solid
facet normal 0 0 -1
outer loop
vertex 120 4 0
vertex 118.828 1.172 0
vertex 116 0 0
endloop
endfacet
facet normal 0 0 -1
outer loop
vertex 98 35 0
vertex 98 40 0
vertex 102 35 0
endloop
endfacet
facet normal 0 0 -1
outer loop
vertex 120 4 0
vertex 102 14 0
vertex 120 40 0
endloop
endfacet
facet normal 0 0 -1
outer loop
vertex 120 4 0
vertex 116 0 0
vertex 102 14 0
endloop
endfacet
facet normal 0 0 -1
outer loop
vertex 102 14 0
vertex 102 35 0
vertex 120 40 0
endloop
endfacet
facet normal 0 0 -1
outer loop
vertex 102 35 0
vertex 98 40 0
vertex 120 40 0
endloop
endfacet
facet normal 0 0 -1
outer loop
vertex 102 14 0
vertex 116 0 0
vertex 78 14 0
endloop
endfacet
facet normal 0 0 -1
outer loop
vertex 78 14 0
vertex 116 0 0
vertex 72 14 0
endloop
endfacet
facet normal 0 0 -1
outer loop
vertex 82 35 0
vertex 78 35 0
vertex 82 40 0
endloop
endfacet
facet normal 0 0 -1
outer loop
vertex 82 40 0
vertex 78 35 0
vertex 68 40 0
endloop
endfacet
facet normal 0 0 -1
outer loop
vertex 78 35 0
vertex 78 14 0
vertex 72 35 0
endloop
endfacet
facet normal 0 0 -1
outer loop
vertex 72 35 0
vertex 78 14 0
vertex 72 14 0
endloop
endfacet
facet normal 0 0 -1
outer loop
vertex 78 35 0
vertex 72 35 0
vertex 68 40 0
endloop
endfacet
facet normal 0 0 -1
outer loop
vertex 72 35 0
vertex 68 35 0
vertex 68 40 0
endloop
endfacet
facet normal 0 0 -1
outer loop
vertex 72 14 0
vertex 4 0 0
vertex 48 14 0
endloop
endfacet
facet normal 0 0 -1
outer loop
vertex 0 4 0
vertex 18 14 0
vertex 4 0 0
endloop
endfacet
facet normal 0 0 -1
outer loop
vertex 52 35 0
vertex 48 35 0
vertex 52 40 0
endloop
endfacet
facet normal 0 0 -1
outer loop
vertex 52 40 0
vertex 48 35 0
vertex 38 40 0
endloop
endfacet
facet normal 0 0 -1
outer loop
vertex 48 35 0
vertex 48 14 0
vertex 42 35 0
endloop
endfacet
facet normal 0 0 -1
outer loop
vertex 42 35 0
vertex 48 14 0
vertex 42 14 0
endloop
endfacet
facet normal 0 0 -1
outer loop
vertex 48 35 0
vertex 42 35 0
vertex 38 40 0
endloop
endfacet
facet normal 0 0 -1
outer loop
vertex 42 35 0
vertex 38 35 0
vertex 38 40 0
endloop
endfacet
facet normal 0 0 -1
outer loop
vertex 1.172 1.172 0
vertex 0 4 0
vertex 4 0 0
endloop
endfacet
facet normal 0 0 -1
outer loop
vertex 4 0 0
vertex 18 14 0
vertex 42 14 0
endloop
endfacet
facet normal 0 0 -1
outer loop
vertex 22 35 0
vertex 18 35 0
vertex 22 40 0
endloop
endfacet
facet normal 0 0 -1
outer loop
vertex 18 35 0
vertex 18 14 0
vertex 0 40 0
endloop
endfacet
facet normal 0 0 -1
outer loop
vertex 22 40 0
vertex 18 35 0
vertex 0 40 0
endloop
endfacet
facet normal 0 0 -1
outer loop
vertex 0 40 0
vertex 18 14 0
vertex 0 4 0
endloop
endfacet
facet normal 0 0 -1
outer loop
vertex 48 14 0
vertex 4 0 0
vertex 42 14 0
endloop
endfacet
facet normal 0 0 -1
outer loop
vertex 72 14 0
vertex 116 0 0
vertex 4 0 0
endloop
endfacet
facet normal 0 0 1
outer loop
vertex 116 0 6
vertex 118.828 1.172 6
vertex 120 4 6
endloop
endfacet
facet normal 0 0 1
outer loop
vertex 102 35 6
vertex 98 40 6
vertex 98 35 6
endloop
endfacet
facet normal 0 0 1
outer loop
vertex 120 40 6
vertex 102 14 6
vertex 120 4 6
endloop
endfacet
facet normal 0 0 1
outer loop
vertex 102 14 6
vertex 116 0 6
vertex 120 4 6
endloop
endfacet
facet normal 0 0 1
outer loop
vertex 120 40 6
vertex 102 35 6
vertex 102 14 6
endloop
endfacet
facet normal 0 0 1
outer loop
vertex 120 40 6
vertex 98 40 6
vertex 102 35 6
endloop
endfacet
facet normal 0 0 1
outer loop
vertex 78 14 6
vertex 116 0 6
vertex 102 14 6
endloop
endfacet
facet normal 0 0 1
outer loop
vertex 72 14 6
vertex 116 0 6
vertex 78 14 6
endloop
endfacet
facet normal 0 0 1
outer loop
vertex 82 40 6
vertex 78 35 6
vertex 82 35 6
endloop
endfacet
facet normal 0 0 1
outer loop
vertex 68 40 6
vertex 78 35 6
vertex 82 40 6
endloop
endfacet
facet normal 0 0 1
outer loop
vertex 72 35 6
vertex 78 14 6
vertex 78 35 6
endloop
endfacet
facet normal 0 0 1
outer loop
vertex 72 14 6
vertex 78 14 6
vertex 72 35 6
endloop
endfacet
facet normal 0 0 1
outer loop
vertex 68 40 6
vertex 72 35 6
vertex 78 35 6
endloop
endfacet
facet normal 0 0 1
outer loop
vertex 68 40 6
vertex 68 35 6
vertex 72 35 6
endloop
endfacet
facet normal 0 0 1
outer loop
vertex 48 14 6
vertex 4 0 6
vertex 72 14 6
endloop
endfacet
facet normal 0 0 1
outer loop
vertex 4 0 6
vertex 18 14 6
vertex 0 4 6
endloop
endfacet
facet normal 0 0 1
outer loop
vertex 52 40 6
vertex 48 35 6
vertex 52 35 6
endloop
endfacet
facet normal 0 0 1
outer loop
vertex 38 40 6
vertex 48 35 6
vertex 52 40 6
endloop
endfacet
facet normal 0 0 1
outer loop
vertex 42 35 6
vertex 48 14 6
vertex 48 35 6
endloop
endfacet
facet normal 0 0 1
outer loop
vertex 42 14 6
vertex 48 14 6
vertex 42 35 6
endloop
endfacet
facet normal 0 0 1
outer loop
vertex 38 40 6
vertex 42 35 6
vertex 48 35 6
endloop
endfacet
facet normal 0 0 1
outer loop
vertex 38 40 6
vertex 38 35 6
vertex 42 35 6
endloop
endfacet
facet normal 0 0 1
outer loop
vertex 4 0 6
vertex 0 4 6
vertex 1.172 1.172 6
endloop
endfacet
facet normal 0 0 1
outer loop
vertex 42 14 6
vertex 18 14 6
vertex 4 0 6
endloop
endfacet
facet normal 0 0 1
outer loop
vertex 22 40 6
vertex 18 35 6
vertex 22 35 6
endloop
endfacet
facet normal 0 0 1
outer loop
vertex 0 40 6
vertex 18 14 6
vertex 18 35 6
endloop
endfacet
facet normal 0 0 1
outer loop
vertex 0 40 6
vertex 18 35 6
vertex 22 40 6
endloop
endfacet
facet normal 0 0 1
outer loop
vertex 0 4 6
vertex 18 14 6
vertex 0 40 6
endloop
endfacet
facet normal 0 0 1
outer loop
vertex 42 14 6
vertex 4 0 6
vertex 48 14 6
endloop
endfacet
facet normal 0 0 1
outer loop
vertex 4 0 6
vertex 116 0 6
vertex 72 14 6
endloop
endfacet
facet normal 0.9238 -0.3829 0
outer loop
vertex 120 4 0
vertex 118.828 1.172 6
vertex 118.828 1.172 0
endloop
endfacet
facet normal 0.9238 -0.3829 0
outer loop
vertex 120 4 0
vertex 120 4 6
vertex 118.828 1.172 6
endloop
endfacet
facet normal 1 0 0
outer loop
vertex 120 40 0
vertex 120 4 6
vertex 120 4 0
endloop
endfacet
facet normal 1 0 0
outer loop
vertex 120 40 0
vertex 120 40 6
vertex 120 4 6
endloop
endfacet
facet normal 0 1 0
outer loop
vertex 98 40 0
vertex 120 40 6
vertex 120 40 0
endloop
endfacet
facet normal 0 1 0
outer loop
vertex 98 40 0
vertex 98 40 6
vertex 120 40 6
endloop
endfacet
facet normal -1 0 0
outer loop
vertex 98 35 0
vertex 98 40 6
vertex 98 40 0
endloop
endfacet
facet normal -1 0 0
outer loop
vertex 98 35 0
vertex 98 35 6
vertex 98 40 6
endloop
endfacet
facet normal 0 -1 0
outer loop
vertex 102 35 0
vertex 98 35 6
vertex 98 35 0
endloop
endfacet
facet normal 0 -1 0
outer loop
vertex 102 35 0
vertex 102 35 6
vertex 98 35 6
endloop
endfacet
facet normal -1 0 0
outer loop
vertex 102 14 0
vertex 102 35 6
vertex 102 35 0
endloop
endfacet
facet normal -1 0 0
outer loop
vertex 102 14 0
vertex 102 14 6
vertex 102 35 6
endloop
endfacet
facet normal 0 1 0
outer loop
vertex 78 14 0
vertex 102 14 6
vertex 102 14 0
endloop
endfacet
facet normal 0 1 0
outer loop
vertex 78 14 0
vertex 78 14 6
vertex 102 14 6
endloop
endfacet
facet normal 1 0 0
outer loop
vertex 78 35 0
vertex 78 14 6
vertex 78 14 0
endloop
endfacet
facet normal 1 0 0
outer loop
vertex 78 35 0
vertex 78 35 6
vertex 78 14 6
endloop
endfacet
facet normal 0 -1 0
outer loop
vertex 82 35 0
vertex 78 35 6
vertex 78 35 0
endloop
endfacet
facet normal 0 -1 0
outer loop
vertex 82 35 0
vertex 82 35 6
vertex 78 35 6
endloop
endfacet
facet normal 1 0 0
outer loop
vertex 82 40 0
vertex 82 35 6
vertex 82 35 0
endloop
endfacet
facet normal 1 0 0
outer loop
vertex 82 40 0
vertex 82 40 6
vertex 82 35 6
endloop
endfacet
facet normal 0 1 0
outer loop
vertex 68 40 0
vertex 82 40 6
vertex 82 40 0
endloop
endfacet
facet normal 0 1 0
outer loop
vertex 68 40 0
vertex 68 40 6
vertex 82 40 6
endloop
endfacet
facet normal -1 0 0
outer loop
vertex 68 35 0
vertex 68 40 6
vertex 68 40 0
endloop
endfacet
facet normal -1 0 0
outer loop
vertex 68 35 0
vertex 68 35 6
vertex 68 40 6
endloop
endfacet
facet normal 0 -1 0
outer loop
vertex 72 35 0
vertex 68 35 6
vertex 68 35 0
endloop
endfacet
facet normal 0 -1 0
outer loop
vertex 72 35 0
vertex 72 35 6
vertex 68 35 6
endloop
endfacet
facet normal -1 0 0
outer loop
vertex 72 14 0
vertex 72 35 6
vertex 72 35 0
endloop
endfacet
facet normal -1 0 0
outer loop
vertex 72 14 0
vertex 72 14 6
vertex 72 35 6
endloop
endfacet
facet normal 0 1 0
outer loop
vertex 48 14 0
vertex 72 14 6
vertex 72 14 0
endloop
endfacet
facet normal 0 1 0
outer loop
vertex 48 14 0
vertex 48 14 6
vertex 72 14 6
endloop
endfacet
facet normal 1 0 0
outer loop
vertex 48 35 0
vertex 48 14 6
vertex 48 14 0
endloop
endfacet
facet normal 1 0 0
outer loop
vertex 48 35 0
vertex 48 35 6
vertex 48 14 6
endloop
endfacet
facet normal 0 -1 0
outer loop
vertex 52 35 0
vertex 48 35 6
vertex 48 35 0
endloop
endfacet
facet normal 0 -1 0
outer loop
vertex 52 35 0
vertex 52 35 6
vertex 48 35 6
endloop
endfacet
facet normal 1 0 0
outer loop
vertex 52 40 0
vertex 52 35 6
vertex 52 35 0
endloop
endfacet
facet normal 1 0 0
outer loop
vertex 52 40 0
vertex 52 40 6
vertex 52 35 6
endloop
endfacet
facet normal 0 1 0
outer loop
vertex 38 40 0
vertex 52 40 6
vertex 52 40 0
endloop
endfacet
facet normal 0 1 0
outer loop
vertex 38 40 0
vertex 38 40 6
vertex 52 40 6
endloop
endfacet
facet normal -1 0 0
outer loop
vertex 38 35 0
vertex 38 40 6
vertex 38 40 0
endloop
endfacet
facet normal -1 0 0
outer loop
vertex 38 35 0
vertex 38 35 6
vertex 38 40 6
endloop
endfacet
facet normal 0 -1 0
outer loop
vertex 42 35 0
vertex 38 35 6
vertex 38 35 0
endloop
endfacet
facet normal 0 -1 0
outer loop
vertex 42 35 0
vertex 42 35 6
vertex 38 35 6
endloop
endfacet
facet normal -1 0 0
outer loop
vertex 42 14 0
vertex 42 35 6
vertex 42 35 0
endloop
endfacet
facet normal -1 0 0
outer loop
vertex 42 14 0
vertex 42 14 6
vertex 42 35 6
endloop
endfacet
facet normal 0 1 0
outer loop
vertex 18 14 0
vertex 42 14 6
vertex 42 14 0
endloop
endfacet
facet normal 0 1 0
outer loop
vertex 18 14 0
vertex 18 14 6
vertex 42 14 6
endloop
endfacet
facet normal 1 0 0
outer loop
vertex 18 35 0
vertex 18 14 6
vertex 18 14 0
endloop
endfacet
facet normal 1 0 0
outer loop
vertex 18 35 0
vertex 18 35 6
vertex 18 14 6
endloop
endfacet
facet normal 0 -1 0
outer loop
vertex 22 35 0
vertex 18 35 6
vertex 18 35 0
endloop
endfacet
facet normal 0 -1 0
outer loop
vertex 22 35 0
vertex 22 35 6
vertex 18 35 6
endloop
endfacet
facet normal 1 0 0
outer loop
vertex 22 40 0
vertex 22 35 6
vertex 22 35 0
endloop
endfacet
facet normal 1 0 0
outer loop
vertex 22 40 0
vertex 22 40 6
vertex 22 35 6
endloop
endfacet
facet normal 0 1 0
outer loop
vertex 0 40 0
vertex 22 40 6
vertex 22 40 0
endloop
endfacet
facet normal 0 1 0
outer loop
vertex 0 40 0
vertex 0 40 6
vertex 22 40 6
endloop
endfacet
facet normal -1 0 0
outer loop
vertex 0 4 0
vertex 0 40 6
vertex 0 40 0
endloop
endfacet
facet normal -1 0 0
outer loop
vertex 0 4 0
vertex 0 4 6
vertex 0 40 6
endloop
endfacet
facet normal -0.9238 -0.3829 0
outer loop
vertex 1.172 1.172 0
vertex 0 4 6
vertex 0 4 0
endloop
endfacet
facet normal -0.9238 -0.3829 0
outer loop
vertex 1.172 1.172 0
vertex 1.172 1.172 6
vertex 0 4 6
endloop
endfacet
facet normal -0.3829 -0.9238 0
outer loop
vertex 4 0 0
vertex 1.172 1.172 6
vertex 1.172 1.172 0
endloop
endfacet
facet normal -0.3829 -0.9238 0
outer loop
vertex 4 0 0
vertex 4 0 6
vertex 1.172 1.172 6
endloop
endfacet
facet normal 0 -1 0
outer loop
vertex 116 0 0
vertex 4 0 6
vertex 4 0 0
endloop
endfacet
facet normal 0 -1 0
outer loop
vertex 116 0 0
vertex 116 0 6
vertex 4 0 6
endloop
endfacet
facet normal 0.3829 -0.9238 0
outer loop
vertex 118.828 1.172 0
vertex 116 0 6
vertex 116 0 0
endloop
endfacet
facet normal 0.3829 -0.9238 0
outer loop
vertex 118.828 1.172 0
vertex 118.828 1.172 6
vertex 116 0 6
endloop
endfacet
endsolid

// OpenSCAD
$fn = 32;

// ----------------------------------------------------------------------
// Oversize slot bar: 120 mm bar with 3 oversize windows
// ----------------------------------------------------------------------

// --- parameters (mm) ---
profile_height = 6;       // extrusion height
profile_points = 32;      // points of the closed outline

profile = [[0, 4], [1.172, 1.172], [4, 0], [116, 0], [118.828, 1.172], [120, 4], [120, 40], [98, 40], [98, 35], [102, 35], [102, 14], [78, 14], [78, 35], [82, 35], [82, 40], [68, 40], [68, 35], [72, 35], [72, 14], [48, 14], [48, 35], [52, 35], [52, 40], [38, 40], [38, 35], [42, 35], [42, 14], [18, 14], [18, 35], [22, 35], [22, 40], [0, 40]];  // single closed polygon, 32 points, counter clockwise

// --- the one profile operation ---
linear_extrude(height = profile_height) polygon(points = profile);
